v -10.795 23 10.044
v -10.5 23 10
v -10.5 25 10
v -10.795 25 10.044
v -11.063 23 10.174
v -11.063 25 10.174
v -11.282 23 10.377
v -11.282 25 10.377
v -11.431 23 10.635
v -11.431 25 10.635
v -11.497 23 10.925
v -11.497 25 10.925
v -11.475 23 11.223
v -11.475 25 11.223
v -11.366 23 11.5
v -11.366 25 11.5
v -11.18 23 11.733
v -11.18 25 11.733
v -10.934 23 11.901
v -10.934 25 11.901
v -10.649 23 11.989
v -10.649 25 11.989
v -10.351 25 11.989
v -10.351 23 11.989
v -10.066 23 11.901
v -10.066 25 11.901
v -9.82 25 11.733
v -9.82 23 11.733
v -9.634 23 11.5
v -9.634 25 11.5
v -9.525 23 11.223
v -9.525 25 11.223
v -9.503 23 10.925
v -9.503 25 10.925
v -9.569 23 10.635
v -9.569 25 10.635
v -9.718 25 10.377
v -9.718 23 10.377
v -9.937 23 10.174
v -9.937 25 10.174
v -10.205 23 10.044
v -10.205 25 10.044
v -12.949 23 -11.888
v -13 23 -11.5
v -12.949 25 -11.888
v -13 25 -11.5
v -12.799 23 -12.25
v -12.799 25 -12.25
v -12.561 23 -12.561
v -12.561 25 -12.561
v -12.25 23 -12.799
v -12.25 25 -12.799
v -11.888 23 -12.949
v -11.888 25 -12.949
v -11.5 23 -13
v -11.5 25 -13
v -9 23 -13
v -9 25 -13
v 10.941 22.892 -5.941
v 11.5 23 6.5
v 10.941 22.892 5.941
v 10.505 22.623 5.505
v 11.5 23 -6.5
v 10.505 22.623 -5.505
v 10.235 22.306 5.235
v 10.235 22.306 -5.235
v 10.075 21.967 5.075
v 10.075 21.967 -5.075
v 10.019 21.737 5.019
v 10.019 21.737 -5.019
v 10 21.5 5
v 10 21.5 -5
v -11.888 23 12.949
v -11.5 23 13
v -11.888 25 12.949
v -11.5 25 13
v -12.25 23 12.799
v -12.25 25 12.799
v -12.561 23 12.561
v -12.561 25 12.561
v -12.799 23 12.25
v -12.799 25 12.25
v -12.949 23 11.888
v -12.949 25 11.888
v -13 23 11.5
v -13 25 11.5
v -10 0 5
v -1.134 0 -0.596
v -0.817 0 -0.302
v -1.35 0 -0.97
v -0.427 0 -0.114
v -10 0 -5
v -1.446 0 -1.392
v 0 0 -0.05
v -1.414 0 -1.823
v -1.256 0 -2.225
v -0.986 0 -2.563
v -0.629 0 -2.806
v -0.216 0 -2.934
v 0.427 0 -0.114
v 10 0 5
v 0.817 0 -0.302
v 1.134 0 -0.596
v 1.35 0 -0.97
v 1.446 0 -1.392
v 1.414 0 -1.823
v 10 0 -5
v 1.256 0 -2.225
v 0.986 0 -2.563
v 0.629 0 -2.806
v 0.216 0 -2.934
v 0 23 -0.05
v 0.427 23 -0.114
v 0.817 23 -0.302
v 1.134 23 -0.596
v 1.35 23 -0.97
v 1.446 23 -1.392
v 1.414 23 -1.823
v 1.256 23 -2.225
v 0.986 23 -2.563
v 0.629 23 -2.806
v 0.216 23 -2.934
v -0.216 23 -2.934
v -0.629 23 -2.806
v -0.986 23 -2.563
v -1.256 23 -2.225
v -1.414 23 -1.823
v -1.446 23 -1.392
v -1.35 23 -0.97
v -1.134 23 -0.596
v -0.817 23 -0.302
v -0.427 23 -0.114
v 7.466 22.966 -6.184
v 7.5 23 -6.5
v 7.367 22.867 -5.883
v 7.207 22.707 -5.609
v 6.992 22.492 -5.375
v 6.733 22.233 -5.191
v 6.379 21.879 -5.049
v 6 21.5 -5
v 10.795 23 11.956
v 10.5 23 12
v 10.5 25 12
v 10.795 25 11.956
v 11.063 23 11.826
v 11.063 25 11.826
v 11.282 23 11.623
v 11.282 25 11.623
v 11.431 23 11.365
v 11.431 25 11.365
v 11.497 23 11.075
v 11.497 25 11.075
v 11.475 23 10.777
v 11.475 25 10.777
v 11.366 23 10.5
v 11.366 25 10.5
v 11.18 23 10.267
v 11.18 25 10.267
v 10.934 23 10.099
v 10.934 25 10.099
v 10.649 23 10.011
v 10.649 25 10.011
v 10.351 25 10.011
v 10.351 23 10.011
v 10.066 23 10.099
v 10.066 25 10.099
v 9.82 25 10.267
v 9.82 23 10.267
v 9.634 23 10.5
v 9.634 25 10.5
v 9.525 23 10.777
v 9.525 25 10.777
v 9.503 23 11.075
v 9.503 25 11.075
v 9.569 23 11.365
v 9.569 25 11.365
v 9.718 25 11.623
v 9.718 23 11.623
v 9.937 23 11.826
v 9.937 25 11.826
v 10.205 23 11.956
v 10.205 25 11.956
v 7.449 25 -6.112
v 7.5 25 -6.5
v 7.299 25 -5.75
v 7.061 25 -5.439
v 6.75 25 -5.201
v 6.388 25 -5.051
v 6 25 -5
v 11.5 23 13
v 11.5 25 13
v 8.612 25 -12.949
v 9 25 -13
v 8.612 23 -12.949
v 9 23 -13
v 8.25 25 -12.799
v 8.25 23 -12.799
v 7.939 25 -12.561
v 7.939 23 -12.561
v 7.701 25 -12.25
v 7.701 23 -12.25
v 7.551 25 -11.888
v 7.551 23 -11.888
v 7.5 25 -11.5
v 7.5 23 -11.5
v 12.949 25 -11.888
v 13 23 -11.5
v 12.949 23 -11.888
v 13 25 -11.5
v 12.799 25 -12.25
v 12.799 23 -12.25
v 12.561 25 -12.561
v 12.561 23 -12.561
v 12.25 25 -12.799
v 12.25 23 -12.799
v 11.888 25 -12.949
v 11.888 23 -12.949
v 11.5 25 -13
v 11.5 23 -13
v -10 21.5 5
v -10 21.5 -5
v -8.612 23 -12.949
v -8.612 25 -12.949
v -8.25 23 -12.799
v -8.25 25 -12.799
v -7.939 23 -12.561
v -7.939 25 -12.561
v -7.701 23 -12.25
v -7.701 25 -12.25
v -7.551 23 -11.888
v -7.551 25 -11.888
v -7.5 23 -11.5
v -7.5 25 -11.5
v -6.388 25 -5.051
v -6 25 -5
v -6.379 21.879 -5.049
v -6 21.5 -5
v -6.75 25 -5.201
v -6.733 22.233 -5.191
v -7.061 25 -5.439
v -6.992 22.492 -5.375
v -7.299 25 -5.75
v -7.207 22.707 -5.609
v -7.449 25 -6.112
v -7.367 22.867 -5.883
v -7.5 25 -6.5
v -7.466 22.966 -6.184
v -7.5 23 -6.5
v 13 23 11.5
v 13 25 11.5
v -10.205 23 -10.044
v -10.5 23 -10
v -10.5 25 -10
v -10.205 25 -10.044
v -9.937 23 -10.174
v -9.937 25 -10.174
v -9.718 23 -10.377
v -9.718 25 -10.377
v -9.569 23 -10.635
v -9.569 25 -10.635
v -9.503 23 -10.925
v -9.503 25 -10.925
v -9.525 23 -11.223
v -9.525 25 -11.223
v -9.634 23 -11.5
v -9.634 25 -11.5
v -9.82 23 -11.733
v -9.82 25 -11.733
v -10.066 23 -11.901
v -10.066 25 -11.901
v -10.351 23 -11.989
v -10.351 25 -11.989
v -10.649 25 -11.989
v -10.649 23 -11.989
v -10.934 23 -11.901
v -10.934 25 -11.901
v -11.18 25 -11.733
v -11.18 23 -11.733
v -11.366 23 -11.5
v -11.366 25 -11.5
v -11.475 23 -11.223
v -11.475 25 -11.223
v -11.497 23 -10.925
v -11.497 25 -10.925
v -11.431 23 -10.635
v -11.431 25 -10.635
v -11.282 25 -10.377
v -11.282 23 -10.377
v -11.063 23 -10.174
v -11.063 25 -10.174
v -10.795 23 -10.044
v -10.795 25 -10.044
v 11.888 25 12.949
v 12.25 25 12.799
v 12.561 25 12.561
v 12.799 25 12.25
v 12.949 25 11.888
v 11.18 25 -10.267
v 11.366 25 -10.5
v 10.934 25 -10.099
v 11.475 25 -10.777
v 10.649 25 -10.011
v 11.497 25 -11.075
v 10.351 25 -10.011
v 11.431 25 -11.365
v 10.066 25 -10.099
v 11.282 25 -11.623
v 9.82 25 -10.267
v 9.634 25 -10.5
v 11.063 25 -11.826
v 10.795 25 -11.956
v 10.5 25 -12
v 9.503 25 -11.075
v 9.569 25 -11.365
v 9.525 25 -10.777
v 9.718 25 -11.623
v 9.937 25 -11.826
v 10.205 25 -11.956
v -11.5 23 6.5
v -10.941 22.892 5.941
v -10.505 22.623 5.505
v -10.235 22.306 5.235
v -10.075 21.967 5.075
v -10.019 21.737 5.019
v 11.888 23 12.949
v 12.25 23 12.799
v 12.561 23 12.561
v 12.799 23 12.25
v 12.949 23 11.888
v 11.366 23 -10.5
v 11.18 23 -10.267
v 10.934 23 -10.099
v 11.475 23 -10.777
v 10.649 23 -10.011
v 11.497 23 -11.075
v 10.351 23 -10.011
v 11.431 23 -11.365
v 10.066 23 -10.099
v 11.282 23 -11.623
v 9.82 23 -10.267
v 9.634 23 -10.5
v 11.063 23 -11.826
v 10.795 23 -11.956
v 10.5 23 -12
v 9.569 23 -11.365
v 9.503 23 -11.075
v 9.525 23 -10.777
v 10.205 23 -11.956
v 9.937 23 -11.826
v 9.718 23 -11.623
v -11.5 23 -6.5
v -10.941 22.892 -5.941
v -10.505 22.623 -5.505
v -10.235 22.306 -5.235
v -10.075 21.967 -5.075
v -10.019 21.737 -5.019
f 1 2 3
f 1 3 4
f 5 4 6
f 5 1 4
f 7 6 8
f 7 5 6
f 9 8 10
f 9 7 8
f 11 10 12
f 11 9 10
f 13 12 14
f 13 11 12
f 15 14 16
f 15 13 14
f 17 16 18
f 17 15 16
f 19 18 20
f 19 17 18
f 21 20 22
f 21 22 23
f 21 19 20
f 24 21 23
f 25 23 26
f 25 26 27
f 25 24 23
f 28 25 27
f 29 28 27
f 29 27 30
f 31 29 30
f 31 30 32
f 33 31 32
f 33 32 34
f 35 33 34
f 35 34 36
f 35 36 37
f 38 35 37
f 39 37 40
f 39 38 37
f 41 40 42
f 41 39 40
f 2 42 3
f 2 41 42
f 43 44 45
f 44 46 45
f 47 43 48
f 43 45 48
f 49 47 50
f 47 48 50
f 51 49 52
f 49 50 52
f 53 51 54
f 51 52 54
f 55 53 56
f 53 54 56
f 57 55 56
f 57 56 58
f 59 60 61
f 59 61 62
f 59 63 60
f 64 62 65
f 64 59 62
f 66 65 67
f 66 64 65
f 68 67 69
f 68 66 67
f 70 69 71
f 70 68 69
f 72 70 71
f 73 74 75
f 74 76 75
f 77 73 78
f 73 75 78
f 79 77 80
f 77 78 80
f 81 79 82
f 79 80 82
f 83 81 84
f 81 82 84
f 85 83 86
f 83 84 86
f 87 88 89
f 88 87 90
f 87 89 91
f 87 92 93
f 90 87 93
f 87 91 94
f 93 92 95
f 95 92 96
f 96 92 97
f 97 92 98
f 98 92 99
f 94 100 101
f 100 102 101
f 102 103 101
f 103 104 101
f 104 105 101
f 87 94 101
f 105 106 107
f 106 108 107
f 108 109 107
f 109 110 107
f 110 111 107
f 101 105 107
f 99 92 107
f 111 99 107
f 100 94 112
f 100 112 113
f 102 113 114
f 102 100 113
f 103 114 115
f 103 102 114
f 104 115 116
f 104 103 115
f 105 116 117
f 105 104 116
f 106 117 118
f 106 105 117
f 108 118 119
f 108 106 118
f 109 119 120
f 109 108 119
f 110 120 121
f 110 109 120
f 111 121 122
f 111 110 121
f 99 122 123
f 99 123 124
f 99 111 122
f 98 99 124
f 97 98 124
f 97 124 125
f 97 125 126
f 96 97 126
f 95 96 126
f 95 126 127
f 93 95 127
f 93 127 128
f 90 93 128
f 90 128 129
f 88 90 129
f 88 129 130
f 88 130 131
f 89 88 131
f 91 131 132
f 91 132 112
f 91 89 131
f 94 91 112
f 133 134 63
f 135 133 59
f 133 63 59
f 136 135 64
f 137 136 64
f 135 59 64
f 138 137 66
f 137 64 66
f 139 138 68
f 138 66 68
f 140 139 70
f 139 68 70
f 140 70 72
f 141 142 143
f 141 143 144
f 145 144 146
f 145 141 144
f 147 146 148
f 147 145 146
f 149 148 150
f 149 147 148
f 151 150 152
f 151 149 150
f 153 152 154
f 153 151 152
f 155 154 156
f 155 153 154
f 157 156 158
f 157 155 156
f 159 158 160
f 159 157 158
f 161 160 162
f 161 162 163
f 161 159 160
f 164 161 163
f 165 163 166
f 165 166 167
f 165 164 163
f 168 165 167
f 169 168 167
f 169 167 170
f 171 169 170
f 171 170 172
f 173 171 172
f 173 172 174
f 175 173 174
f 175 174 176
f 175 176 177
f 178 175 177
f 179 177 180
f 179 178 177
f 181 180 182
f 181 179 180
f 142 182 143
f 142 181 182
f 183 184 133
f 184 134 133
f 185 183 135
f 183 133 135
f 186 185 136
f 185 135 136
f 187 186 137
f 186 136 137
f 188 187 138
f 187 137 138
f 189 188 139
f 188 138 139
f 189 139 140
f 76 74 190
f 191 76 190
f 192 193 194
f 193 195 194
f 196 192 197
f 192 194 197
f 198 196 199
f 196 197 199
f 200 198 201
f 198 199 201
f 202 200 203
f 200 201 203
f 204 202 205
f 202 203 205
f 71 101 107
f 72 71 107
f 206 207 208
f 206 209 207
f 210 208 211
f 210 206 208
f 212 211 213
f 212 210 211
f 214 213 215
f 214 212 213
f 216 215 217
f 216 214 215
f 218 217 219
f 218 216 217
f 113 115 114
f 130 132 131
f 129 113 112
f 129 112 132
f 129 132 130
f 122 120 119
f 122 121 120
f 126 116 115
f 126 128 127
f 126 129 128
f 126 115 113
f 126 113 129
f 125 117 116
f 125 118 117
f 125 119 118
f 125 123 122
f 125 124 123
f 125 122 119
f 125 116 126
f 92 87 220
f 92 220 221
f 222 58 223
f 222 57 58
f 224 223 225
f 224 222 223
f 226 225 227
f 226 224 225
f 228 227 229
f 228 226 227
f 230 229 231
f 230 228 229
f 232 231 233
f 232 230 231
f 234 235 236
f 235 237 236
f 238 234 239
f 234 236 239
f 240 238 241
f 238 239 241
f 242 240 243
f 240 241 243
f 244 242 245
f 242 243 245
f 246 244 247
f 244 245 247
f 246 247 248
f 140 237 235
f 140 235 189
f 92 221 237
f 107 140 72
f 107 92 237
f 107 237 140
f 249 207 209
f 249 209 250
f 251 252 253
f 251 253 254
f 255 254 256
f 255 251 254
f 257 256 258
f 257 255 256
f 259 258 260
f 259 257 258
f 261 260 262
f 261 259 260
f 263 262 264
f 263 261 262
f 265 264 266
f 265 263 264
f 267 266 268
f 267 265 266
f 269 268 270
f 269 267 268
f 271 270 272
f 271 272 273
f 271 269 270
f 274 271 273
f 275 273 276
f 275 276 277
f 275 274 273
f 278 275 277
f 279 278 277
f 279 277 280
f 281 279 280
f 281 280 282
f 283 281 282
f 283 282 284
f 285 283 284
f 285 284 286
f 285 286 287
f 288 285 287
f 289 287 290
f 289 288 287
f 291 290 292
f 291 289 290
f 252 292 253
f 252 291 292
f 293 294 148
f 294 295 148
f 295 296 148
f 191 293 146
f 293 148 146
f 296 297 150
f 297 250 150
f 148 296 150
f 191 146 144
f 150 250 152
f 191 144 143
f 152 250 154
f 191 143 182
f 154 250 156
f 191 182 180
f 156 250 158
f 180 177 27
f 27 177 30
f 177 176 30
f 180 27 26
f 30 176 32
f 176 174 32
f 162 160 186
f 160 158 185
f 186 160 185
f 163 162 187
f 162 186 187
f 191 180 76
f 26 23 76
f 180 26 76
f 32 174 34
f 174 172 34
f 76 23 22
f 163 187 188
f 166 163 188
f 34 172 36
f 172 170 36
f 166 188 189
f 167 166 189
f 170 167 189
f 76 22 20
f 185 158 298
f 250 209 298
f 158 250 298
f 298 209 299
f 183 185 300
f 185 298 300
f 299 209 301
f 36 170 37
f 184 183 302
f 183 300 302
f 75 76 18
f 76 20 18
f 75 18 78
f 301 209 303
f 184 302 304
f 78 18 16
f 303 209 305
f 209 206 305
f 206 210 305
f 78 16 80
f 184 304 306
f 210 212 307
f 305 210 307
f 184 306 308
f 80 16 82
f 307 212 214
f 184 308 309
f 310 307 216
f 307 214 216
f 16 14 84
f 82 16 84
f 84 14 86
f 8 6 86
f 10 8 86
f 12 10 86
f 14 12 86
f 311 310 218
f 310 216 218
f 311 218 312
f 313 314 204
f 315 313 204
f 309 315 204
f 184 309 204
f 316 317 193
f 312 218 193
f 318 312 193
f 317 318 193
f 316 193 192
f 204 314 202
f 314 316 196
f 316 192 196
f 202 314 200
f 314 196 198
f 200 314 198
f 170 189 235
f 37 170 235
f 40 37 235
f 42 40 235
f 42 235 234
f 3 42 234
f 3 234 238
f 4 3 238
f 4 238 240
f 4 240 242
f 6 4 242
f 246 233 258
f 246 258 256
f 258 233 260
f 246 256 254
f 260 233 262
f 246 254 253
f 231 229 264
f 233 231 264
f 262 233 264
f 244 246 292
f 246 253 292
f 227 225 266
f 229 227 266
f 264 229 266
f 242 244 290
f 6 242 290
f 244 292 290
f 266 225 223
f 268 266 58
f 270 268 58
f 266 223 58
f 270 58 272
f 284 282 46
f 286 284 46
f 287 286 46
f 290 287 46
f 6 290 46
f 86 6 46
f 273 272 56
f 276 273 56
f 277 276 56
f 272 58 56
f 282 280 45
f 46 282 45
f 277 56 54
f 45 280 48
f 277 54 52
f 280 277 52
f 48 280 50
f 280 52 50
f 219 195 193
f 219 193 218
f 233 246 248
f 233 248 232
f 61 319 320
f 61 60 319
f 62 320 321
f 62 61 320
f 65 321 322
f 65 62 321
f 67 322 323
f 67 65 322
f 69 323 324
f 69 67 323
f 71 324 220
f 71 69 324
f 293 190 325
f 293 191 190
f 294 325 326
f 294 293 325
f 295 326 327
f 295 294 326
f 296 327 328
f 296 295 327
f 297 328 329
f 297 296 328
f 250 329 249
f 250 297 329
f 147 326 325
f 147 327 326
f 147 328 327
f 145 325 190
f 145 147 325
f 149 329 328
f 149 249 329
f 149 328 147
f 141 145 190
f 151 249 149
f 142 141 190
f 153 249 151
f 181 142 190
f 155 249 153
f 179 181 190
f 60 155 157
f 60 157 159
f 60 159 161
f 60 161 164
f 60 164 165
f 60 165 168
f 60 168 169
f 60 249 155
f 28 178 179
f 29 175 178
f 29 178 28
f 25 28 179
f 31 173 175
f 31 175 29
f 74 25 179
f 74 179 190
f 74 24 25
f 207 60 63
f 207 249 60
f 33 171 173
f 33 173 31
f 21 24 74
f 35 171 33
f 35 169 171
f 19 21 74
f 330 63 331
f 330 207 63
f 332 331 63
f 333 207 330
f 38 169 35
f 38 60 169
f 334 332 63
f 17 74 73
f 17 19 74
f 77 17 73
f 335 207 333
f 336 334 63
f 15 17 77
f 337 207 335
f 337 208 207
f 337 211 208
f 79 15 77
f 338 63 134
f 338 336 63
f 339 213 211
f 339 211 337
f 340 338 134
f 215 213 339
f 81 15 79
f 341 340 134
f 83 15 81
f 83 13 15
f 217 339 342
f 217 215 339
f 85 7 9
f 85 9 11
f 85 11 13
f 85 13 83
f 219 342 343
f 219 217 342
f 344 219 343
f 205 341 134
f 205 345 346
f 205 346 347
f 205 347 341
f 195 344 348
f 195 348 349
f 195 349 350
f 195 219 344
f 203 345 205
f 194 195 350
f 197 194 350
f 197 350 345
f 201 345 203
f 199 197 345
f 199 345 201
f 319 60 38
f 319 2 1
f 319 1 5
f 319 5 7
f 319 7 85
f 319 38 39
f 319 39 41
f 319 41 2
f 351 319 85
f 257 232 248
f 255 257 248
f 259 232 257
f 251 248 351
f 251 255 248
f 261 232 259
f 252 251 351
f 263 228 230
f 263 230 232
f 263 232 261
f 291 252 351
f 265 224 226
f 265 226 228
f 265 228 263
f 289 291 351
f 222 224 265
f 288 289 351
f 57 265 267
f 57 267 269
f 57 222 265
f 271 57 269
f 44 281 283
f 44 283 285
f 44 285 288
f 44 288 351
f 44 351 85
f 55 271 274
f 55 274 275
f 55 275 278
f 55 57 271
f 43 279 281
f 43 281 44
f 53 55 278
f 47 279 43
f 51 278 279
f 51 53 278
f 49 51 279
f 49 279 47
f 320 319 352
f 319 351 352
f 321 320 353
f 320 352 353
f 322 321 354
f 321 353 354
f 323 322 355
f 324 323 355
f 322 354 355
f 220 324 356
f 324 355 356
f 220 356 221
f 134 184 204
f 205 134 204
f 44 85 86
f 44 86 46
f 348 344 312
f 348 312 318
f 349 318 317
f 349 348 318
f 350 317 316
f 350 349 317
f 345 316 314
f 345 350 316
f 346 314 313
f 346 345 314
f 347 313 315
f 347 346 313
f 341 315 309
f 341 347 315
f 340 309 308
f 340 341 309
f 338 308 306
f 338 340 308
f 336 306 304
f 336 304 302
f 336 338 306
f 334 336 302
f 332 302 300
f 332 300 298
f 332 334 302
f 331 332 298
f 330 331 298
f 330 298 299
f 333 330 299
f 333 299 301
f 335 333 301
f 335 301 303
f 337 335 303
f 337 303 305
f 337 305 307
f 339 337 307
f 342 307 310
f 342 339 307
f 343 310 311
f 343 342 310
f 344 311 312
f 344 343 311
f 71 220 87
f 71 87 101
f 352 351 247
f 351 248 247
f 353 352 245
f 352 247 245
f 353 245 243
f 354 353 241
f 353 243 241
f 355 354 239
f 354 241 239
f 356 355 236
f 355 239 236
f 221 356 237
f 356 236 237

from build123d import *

# Parameters (mm, degrees)
SKETCH_1_W          = 20
SKETCH_1_H          = 10
SKETCH_1_R          = 1.45
EXTRUDE_1_DEPTH     = 23
SKETCH_2_R          = 1
EXTRUDE_2_DEPTH     = 2
SKETCH_3_W          = 15
SKETCH_3_H          = 16
CUT_EXTRUDE_1_DEPTH = 15
FILLET_3_R          = 1.5


with BuildPart() as part:
    # 草图1 → 凸台-拉伸1 (new body)
    with BuildSketch(Plane(origin=(0, 0, 0), x_dir=(1, 0, 0), z_dir=(0, 1, 0))):
        Rectangle(SKETCH_1_W, SKETCH_1_H)
        with Locations(Location((0, 1.5, 0), (0, 0, 270))):
            Circle(SKETCH_1_R, mode=Mode.SUBTRACT)
    extrude(amount=EXTRUDE_1_DEPTH)

    # 草图2 → 凸台-拉伸2 (add)
    with BuildSketch(Plane(origin=(0, 23, 0), x_dir=(1, 0, 0), z_dir=(0, 1, 0))):
        Polygon((13, -13), (0, -13), (-13, -13), (-13, 13), (13, 13), align=None)
        with Locations(Location((-10.5, 11, 0), (0, 0, 270))):
            Circle(SKETCH_2_R, mode=Mode.SUBTRACT)
        with Locations(Location((10.5, 11, 0), (0, 0, 90))):
            Circle(SKETCH_2_R, mode=Mode.SUBTRACT)
        with Locations(Location((10.5, -11, 0), (0, 0, 270))):
            Circle(SKETCH_2_R, mode=Mode.SUBTRACT)
        with Locations(Location((-10.5, -11, 0), (0, 0, 90))):
            Circle(SKETCH_2_R, mode=Mode.SUBTRACT)
    extrude(amount=EXTRUDE_2_DEPTH)

    # 草图3 → 切除-拉伸1 (cut)
    with BuildSketch(Plane(origin=(0, 25, 0), x_dir=(1, 0, 0), z_dir=(0, 1, 0))):
        with Locations((0, 13)):
            Rectangle(SKETCH_3_W, SKETCH_3_H)
    extrude(amount=-CUT_EXTRUDE_1_DEPTH, mode=Mode.SUBTRACT)

    # 圆角3
    fillet_3_edges = [part.edges().sort_by_distance(p)[0] for p in [
        (10, 23, 0),
        (8.75, 23, -5),
        (-13, 24, -13),
        (-13, 24, 13),
        (13, 24, 13),
        (13, 24, -13),
        (7.5, 24, -13),
        (-7.5, 24, -13),
        (-8.75, 23, -5),
        (7.5, 24, -5),
        (-7.5, 24, -5),
        (-10, 23, 0),
        (0, 23, 5),
    ]]
    fillet(fillet_3_edges, radius=FILLET_3_R - 0.0001)  # a hair under: the kernel refuses the full size


solid = part.part
